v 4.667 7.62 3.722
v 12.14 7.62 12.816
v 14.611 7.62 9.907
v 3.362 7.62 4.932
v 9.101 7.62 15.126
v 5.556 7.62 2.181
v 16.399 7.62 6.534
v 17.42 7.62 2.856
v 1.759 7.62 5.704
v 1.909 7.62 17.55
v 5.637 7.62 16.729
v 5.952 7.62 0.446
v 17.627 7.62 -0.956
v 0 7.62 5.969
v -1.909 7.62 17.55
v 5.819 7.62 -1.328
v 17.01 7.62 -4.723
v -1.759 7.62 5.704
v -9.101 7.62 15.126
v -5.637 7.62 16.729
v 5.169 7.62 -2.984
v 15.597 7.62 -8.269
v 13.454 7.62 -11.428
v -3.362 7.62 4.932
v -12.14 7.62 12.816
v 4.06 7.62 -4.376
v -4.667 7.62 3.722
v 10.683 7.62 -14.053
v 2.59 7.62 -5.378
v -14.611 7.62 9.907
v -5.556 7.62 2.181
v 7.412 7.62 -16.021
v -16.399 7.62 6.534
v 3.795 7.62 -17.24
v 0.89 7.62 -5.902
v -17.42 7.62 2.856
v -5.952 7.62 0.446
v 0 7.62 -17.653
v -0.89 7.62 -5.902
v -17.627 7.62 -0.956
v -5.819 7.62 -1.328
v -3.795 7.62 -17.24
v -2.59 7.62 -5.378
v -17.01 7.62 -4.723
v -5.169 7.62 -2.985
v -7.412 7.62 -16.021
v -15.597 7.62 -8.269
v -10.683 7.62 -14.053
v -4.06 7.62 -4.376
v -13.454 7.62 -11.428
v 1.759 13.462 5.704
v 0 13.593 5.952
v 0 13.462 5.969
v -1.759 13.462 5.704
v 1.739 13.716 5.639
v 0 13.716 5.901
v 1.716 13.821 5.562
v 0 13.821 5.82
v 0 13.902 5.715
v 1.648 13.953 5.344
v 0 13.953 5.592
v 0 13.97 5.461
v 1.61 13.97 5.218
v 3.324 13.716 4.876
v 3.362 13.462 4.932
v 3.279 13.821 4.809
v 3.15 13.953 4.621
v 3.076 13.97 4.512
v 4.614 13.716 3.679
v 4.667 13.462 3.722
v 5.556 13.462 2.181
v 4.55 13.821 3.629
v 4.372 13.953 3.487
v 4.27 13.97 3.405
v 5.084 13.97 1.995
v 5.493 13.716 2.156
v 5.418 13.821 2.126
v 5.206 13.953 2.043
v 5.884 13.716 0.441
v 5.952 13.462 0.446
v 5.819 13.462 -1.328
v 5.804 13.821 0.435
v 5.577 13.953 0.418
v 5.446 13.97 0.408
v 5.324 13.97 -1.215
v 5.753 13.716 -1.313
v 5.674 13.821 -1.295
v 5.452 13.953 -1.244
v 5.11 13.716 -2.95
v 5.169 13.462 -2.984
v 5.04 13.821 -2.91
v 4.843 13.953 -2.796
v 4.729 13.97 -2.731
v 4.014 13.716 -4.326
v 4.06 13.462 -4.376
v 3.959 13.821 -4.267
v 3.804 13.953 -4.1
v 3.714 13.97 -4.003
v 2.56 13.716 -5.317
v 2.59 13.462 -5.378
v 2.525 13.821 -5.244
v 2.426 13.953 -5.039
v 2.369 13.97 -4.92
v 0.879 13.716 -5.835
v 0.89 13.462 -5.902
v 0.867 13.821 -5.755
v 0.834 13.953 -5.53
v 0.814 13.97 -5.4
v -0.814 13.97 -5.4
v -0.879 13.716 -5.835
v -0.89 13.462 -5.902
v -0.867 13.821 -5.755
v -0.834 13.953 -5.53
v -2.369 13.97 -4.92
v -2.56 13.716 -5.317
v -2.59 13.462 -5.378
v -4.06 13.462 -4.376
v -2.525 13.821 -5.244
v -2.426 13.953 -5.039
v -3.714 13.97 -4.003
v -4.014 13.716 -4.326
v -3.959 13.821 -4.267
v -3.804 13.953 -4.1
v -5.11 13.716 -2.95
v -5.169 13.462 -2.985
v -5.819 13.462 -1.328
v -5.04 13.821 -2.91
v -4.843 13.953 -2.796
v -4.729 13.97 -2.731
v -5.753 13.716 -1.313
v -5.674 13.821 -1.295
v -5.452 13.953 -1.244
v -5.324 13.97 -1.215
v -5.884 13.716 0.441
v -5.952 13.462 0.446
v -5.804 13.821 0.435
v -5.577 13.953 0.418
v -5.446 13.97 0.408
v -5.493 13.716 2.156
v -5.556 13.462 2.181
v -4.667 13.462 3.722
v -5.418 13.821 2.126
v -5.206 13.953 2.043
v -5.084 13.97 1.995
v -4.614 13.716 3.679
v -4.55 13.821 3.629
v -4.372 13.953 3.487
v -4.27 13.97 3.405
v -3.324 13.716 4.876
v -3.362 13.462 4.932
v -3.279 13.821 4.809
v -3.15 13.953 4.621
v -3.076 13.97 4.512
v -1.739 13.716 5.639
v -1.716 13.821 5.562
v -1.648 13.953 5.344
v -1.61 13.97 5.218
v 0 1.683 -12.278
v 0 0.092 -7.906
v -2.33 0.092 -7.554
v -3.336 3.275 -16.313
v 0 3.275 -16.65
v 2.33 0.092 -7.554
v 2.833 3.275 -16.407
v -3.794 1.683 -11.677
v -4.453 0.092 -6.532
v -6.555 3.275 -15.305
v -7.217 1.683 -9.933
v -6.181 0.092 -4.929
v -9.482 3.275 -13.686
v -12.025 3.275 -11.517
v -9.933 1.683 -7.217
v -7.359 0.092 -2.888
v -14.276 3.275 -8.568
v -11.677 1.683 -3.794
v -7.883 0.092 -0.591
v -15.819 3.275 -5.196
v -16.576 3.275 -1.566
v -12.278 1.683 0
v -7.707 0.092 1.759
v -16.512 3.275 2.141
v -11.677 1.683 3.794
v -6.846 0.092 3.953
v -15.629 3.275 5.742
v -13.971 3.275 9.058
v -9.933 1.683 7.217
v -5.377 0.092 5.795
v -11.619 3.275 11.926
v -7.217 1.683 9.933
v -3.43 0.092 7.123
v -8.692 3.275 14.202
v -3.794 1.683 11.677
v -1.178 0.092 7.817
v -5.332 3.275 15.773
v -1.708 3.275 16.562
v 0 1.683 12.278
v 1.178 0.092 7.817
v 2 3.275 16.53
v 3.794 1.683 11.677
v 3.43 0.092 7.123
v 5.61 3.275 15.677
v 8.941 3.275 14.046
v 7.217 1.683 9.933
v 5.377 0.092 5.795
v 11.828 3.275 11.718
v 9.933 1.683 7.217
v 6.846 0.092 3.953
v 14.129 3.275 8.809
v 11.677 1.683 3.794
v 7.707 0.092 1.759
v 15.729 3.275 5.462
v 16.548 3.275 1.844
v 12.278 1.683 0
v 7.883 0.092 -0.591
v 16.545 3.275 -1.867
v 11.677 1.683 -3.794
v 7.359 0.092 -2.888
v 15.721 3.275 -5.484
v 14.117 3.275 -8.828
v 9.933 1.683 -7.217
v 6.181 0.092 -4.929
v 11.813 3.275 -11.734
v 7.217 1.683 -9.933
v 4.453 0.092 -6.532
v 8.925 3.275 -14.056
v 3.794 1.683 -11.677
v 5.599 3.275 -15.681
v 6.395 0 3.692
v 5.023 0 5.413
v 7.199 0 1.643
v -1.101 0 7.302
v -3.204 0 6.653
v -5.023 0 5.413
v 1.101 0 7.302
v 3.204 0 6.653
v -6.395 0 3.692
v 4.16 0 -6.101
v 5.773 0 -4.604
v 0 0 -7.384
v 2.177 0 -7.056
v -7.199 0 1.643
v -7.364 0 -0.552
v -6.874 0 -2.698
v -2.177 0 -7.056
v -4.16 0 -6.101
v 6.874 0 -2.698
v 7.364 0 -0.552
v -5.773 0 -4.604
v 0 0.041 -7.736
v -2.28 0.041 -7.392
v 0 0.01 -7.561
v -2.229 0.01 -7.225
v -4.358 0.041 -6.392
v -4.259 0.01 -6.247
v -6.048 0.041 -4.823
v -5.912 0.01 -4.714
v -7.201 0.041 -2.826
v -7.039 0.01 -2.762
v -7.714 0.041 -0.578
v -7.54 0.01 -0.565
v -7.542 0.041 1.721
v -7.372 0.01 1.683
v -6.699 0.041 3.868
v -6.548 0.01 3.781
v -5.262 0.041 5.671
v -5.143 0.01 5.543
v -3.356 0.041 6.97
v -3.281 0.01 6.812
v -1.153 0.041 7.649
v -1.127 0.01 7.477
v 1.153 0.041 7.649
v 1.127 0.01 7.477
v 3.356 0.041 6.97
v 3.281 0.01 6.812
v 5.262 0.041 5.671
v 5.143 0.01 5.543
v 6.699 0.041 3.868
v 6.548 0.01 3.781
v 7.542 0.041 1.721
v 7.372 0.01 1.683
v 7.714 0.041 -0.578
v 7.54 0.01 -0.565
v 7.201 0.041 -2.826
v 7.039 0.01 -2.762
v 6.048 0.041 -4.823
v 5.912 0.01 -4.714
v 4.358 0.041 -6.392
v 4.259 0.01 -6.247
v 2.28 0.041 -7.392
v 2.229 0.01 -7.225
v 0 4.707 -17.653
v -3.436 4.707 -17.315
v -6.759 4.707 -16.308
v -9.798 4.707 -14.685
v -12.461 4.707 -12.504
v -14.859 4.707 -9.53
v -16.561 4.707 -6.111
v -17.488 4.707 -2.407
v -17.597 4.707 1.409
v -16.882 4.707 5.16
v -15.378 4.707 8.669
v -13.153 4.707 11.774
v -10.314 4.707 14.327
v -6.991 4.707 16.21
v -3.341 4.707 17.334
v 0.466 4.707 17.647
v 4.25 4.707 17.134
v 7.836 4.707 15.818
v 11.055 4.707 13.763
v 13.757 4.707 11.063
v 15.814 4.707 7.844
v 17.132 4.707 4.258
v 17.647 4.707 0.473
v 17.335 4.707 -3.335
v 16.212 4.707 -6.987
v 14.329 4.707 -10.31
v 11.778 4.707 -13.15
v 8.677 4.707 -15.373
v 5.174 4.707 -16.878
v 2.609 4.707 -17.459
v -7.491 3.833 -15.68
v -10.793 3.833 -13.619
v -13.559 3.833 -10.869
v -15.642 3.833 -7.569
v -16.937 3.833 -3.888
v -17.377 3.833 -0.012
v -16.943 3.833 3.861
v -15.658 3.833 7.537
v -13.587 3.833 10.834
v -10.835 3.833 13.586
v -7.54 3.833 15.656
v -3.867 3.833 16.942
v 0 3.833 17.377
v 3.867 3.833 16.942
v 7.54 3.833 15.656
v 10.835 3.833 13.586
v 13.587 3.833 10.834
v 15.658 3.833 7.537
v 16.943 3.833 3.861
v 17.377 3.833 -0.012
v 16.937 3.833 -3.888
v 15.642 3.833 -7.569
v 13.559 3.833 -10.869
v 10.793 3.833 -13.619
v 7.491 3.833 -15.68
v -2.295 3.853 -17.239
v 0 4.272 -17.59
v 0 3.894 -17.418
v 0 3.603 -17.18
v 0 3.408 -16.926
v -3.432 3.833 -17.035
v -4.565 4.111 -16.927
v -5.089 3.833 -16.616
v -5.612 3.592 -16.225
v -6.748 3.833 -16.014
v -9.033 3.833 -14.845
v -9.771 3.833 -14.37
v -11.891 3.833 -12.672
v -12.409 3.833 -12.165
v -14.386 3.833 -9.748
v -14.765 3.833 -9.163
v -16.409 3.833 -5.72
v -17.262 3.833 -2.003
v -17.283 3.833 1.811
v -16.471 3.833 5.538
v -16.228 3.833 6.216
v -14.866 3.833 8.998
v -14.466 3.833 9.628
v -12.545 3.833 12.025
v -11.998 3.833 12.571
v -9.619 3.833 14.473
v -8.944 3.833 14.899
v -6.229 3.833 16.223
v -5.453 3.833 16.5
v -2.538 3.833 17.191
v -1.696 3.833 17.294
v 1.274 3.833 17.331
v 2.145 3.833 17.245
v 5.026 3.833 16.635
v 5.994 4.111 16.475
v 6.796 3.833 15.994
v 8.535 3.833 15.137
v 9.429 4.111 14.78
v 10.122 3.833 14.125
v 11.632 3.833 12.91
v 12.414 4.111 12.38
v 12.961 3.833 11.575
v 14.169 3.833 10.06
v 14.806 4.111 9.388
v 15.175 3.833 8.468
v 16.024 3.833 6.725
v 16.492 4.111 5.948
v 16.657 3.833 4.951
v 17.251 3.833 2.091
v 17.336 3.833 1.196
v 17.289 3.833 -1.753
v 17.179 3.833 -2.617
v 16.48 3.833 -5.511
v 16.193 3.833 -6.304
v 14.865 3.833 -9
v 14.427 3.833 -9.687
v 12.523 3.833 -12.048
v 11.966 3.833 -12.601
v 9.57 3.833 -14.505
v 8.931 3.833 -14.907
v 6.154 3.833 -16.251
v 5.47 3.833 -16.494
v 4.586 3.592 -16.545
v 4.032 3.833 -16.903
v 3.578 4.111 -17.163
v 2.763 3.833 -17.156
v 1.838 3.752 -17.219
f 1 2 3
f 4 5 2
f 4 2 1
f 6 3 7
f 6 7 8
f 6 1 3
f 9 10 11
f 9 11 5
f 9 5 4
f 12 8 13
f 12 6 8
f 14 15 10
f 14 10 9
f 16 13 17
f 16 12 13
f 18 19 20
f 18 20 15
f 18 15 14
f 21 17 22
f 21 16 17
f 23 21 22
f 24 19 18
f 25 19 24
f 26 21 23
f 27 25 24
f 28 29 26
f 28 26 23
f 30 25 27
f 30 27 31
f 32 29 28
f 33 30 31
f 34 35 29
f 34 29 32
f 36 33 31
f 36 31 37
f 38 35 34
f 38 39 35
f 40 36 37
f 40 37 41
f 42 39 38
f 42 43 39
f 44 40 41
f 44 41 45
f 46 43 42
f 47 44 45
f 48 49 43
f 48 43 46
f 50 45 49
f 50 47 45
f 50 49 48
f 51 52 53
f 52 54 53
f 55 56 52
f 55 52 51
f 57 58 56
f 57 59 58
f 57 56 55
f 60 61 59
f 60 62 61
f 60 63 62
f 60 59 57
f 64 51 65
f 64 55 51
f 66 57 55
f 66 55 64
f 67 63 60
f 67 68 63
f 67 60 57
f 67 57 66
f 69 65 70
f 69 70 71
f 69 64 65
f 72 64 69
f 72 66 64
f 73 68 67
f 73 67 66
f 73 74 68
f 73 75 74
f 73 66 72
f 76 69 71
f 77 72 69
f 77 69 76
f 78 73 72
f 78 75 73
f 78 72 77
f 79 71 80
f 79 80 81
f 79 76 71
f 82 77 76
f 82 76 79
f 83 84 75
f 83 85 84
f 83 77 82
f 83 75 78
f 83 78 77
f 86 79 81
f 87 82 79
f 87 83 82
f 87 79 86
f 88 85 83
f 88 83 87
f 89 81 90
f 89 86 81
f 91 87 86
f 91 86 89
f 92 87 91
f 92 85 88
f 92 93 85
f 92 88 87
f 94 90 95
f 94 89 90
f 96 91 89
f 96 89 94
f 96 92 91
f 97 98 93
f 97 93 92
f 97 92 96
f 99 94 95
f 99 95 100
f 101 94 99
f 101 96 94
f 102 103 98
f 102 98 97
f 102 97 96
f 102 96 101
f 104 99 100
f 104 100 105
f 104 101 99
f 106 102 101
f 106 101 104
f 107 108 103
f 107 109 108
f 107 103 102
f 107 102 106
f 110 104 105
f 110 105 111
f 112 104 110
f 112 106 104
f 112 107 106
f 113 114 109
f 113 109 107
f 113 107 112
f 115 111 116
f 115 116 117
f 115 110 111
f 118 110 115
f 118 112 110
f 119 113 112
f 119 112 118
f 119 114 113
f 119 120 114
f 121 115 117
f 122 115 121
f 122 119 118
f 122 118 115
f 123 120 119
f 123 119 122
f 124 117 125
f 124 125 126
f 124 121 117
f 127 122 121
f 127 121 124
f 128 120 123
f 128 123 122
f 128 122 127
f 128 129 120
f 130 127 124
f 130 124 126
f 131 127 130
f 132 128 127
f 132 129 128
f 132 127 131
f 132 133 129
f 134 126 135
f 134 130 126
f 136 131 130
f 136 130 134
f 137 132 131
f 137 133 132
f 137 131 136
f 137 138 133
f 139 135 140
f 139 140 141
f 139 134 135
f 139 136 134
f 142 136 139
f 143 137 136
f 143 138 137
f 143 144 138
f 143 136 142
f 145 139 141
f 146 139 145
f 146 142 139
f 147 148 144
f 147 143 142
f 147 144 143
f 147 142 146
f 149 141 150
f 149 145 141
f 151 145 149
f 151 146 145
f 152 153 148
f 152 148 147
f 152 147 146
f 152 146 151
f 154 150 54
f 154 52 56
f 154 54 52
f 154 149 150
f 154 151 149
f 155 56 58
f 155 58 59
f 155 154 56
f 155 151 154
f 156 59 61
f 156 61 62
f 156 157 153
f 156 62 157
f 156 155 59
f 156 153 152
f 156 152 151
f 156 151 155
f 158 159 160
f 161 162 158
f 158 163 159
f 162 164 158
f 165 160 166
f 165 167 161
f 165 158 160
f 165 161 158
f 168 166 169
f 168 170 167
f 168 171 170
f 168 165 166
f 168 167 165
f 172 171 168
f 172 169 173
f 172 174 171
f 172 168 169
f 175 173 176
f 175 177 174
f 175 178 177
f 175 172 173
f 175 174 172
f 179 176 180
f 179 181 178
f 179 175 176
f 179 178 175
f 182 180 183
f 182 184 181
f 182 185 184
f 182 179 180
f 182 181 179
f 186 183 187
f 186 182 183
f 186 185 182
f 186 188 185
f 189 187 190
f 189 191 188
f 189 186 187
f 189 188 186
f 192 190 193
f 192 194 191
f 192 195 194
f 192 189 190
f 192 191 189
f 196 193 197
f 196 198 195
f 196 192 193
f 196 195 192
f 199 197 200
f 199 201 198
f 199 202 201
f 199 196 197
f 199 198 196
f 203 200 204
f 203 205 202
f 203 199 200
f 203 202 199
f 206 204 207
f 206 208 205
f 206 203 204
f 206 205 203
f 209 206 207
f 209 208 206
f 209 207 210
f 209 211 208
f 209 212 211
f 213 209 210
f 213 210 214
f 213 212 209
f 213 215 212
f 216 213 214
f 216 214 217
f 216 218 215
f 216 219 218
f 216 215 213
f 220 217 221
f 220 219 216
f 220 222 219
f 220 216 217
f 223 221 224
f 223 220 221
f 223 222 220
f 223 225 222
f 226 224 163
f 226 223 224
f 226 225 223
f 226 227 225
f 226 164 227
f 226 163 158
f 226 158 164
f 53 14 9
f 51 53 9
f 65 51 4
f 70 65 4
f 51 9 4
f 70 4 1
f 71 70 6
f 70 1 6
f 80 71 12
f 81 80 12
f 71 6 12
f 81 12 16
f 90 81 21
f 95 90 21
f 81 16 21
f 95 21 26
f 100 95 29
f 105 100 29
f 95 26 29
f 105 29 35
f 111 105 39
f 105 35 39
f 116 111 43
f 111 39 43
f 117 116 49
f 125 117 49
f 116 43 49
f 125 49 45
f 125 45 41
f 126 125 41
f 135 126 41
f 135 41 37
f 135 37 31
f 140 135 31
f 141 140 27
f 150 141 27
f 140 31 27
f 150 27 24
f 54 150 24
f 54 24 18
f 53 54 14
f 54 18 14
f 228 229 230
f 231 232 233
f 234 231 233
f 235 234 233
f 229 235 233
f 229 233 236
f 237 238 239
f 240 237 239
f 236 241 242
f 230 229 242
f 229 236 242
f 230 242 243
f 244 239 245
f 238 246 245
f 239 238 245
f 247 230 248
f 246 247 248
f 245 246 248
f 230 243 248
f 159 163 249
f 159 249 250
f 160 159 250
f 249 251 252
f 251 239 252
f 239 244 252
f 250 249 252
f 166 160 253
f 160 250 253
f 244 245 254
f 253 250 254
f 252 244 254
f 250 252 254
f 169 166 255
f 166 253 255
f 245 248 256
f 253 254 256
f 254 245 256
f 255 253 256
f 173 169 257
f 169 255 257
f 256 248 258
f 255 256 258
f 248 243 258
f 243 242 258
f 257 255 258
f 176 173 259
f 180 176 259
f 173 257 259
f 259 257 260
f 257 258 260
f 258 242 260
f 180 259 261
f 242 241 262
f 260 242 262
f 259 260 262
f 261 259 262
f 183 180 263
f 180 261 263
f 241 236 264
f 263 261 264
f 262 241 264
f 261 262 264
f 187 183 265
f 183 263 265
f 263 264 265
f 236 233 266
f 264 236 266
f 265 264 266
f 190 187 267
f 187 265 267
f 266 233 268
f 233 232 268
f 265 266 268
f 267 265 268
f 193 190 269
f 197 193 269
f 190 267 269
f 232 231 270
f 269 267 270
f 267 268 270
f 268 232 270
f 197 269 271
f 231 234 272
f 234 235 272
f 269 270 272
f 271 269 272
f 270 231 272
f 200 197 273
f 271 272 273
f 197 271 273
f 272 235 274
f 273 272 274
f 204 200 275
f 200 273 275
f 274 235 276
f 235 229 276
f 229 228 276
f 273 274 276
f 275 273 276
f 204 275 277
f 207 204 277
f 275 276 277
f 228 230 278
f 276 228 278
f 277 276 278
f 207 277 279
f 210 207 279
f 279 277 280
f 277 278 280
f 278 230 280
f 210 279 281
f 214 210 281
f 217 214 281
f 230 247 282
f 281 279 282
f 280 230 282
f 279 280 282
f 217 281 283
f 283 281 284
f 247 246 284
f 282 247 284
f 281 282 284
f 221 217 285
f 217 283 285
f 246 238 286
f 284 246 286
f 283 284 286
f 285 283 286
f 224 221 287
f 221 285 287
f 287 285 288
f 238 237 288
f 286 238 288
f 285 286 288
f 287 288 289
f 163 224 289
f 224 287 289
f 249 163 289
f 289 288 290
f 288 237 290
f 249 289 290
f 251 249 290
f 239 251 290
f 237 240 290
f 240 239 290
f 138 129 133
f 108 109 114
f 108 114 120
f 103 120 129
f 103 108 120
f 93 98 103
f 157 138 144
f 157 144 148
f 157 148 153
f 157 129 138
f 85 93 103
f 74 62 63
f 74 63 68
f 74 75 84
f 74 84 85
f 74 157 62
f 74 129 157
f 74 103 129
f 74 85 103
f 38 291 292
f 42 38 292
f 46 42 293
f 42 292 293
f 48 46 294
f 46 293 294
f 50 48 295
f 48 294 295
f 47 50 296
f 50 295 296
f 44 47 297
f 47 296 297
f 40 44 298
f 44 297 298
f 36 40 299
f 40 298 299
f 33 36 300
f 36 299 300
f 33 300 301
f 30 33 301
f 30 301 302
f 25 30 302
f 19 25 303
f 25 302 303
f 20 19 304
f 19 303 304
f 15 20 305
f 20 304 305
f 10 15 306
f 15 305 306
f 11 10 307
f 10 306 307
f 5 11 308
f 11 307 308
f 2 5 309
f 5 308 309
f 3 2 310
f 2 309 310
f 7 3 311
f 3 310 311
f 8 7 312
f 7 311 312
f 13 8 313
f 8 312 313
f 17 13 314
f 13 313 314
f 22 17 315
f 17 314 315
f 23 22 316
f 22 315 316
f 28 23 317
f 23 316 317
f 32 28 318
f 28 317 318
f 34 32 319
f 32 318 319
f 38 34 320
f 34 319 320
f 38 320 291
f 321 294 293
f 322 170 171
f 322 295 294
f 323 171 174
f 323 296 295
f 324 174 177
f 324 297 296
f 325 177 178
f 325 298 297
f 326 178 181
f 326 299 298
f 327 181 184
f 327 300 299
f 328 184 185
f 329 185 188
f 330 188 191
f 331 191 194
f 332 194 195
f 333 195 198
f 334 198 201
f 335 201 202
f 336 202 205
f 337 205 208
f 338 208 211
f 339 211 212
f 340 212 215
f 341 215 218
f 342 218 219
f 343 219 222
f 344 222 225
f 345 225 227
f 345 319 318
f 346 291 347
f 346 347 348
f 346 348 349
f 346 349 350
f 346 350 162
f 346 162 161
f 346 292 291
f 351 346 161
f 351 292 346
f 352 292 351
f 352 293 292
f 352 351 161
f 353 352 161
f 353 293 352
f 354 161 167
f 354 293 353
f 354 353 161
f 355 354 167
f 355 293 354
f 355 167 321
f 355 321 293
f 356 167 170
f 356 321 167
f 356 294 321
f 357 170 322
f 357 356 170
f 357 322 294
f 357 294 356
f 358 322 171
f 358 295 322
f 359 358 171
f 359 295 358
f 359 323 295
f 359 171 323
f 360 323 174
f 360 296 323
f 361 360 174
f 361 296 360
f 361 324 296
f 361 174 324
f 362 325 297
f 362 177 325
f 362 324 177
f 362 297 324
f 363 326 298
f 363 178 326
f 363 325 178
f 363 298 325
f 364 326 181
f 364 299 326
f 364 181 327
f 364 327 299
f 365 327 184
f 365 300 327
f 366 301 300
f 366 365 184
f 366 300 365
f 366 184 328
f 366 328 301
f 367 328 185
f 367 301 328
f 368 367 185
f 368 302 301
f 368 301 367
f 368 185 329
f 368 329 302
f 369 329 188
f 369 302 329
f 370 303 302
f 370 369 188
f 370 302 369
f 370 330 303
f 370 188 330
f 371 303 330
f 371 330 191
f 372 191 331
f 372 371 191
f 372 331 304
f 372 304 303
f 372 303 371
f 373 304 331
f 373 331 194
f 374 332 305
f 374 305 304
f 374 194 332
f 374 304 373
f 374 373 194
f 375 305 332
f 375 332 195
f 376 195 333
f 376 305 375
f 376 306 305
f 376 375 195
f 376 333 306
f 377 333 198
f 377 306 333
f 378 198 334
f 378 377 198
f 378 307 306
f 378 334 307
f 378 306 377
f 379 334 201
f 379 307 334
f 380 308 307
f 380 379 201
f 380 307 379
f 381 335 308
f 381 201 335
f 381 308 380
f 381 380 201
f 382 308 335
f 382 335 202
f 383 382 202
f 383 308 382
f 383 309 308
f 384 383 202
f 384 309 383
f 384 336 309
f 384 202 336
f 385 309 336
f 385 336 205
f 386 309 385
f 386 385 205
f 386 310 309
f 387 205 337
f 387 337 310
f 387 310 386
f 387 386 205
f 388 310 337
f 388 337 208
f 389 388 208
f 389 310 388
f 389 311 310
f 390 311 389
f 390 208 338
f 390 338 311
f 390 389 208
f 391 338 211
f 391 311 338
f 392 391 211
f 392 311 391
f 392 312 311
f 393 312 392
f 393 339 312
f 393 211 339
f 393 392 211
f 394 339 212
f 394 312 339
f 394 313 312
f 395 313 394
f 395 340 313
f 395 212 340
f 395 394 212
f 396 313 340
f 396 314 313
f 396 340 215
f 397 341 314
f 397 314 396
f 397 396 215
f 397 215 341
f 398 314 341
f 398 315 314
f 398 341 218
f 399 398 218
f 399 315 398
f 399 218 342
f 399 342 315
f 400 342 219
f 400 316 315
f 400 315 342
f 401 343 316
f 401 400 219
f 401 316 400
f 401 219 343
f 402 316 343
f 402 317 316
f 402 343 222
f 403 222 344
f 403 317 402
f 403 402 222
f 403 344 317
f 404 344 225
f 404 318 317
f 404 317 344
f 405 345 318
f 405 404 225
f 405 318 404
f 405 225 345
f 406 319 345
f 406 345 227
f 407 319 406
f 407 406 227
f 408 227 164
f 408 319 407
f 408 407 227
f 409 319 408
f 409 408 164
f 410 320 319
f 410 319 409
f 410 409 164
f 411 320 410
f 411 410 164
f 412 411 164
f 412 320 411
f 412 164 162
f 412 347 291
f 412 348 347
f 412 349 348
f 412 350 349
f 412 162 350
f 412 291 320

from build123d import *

# Parameters (mm, degrees)
SKETCH1_R           = 17.653
BOSS_EXTRUDE1_DEPTH = 7.62
SKETCH2_R           = 5.969
BOSS_EXTRUDE2_DEPTH = 6.35
CHAMFER1_SIZE       = 10
CHAMFER1_SIZE2      = 3.639702343
FILLET1_R           = 1.524
FILLET2_R           = 0.508


with BuildPart() as part:
    # Sketch1 → Boss-Extrude1 (new body)
    with BuildSketch(Plane(origin=(0, 0, 0), x_dir=(1, 0, 0), z_dir=(0, 1, 0))):
        with Locations(Location((0, 0, 0), (0, 0, 90))):
            Circle(SKETCH1_R)
    extrude(amount=BOSS_EXTRUDE1_DEPTH)

    # Sketch2 → Boss-Extrude2 (add)
    with BuildSketch(Plane(origin=(0, 7.62, 0), x_dir=(1, 0, 0), z_dir=(0, 1, 0))):
        with Locations(Location((0, 0, 0), (0, 0, 270))):
            Circle(SKETCH2_R)
    extrude(amount=BOSS_EXTRUDE2_DEPTH)

    # Chamfer1
    chamfer1_edges = [part.edges().sort_by_distance(p)[0] for p in [
        (0, 0, 17.653),
    ]]
    chamfer1_side = [part.faces().sort_by_distance(p)[0] for p in [
        (0, 0, 0),
    ]]
    chamfer(chamfer1_edges, length=CHAMFER1_SIZE, length2=CHAMFER1_SIZE2, reference=chamfer1_side[0])

    # Fillet1
    fillet1_edges = [part.edges().sort_by_distance(p)[0] for p in [
        (0, 0, 7.653),
        (0, 3.639702343, 17.653),
    ]]
    fillet(fillet1_edges, radius=FILLET1_R)

    # Fillet2
    fillet2_edges = [part.edges().sort_by_distance(p)[0] for p in [
        (0, 13.97, -5.969),
    ]]
    fillet(fillet2_edges, radius=FILLET2_R)


solid = part.part
